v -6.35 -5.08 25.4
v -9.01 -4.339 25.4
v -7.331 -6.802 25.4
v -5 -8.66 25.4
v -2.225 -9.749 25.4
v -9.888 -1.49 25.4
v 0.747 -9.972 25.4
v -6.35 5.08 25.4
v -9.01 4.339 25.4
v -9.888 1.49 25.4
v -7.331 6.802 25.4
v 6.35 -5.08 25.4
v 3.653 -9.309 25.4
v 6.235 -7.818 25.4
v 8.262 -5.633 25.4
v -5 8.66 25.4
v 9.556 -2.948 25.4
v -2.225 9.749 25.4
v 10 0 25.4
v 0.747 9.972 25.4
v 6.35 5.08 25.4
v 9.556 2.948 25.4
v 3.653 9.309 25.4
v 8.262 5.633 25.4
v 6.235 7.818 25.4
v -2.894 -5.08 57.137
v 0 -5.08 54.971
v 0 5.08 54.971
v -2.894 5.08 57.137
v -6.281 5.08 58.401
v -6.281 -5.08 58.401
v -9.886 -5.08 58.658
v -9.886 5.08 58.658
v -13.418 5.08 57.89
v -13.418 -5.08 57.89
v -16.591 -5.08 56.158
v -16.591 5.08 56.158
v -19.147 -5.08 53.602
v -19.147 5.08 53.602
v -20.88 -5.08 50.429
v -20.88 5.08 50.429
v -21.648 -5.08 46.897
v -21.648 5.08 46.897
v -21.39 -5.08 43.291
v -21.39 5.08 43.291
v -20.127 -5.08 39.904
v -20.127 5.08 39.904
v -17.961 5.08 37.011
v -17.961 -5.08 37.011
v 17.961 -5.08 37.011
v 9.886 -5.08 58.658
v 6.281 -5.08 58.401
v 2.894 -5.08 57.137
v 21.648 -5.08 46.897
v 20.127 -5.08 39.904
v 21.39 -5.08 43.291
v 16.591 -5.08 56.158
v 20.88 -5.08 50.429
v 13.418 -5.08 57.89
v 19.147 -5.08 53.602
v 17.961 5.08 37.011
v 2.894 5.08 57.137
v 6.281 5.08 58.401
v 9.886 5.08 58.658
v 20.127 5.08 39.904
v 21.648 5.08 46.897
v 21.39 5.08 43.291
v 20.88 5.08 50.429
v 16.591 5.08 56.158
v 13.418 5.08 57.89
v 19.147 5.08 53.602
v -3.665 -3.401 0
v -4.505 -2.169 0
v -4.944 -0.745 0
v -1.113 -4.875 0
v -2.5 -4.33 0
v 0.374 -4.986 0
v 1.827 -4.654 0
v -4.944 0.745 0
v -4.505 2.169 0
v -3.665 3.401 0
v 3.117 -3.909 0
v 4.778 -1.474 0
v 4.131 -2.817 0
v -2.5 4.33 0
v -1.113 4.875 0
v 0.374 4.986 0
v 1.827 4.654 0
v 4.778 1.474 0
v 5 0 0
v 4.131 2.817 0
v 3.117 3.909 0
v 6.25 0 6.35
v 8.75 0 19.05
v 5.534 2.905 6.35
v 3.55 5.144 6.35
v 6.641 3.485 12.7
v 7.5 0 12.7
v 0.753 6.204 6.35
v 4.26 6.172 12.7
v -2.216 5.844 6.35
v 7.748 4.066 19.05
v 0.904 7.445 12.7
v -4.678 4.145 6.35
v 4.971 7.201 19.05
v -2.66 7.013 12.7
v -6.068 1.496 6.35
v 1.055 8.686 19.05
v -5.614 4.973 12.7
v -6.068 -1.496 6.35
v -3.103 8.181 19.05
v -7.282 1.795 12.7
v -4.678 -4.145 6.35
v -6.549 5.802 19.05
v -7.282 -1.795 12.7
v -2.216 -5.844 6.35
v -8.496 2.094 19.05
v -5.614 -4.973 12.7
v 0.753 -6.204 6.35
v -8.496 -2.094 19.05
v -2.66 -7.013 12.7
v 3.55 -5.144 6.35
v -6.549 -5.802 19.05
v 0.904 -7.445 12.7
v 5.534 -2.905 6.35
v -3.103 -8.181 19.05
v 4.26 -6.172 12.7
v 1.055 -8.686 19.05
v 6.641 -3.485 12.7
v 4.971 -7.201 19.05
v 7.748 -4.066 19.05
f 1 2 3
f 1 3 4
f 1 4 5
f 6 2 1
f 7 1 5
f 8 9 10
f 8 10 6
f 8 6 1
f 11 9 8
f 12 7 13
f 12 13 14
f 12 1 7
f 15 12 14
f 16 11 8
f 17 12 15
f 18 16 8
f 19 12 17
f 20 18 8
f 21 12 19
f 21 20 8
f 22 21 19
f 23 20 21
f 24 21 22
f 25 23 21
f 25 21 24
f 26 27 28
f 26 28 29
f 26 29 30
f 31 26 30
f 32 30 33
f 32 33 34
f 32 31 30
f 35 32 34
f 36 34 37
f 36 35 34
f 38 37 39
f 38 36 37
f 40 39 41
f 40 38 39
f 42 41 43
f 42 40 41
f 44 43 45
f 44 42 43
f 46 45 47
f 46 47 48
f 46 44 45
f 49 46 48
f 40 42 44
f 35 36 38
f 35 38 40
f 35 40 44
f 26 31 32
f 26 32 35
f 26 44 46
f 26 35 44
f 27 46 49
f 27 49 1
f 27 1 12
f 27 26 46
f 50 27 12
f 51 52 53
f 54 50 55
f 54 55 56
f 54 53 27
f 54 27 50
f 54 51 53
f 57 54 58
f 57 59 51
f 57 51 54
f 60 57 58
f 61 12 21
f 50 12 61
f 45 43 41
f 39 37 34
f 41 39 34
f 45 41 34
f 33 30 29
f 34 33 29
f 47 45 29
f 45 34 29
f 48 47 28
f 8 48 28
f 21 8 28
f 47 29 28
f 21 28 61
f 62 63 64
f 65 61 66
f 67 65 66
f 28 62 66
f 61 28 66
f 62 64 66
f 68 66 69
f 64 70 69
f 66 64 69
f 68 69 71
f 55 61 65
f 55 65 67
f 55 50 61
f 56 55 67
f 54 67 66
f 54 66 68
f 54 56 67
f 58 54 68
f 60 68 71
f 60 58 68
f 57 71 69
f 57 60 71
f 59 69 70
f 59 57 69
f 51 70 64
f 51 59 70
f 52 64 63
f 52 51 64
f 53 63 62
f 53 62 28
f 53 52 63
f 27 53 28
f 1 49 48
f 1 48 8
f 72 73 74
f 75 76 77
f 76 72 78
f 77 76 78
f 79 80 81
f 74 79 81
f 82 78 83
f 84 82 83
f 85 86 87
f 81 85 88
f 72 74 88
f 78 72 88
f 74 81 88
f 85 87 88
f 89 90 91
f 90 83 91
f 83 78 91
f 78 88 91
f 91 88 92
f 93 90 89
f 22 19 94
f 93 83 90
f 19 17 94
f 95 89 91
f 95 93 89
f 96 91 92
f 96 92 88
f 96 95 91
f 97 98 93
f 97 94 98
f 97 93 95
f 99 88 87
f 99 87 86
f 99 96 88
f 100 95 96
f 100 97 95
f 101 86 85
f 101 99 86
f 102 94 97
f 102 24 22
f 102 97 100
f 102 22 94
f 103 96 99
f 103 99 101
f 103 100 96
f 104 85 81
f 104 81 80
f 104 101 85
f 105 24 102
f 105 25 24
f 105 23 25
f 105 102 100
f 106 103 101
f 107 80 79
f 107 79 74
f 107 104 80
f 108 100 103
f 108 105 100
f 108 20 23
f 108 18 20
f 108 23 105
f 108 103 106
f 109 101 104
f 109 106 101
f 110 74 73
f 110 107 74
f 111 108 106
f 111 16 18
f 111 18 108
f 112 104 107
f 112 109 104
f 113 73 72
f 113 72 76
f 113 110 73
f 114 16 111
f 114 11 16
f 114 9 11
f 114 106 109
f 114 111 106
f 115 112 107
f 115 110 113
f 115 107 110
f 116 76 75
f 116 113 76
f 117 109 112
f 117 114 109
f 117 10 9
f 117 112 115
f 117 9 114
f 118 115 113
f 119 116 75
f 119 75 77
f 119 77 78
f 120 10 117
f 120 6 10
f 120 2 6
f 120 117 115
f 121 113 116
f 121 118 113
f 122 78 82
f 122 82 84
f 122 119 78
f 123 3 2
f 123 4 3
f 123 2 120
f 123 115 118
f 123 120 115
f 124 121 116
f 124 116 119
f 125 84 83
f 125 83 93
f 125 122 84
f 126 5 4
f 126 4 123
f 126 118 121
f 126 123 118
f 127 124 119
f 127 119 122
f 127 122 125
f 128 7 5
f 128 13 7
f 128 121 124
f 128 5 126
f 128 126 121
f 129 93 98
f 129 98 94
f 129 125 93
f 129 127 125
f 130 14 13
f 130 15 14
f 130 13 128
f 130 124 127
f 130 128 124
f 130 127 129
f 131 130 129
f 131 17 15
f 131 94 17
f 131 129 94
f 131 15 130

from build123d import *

# Parameters (mm, degrees)
F0_R     = 5
F2_R     = 10
F5_DEPTH = 5.08
F6_DEPTH = 5.08


with BuildPart() as f3:
    # F0 (on Top) → F3 section 0
    with BuildSketch(Plane.XY):
        Circle(F0_R)
    # F2 (on offset) → F3 section 1
    with BuildSketch(Plane.XY.offset(25.4)):
        Circle(F2_R)
    loft()

    # F4 (on Front) → F5 (join)
    with BuildSketch(Plane.XZ):
        with BuildLine():
            ThreePointArc((17.960512, 37.010512), (17.960512, 54.971024), (0, 54.971024))
            ThreePointArc((0, 54.971024), (-17.960512, 54.971024), (-17.960512, 37.010512))
            Line((-17.960512, 37.010512), (0, 19.05))
            Line((0, 19.05), (17.960512, 37.010512))
        make_face()
    extrude(amount=F5_DEPTH)

    # F4 (on Front) → F6 (join)
    with BuildSketch(Plane.XZ):
        with BuildLine():
            ThreePointArc((17.960512, 37.010512), (17.960512, 54.971024), (0, 54.971024))
            ThreePointArc((0, 54.971024), (-17.960512, 54.971024), (-17.960512, 37.010512))
            Line((-17.960512, 37.010512), (0, 19.05))
            Line((0, 19.05), (17.960512, 37.010512))
        make_face()
    extrude(amount=-F6_DEPTH)


solid = f3.part
